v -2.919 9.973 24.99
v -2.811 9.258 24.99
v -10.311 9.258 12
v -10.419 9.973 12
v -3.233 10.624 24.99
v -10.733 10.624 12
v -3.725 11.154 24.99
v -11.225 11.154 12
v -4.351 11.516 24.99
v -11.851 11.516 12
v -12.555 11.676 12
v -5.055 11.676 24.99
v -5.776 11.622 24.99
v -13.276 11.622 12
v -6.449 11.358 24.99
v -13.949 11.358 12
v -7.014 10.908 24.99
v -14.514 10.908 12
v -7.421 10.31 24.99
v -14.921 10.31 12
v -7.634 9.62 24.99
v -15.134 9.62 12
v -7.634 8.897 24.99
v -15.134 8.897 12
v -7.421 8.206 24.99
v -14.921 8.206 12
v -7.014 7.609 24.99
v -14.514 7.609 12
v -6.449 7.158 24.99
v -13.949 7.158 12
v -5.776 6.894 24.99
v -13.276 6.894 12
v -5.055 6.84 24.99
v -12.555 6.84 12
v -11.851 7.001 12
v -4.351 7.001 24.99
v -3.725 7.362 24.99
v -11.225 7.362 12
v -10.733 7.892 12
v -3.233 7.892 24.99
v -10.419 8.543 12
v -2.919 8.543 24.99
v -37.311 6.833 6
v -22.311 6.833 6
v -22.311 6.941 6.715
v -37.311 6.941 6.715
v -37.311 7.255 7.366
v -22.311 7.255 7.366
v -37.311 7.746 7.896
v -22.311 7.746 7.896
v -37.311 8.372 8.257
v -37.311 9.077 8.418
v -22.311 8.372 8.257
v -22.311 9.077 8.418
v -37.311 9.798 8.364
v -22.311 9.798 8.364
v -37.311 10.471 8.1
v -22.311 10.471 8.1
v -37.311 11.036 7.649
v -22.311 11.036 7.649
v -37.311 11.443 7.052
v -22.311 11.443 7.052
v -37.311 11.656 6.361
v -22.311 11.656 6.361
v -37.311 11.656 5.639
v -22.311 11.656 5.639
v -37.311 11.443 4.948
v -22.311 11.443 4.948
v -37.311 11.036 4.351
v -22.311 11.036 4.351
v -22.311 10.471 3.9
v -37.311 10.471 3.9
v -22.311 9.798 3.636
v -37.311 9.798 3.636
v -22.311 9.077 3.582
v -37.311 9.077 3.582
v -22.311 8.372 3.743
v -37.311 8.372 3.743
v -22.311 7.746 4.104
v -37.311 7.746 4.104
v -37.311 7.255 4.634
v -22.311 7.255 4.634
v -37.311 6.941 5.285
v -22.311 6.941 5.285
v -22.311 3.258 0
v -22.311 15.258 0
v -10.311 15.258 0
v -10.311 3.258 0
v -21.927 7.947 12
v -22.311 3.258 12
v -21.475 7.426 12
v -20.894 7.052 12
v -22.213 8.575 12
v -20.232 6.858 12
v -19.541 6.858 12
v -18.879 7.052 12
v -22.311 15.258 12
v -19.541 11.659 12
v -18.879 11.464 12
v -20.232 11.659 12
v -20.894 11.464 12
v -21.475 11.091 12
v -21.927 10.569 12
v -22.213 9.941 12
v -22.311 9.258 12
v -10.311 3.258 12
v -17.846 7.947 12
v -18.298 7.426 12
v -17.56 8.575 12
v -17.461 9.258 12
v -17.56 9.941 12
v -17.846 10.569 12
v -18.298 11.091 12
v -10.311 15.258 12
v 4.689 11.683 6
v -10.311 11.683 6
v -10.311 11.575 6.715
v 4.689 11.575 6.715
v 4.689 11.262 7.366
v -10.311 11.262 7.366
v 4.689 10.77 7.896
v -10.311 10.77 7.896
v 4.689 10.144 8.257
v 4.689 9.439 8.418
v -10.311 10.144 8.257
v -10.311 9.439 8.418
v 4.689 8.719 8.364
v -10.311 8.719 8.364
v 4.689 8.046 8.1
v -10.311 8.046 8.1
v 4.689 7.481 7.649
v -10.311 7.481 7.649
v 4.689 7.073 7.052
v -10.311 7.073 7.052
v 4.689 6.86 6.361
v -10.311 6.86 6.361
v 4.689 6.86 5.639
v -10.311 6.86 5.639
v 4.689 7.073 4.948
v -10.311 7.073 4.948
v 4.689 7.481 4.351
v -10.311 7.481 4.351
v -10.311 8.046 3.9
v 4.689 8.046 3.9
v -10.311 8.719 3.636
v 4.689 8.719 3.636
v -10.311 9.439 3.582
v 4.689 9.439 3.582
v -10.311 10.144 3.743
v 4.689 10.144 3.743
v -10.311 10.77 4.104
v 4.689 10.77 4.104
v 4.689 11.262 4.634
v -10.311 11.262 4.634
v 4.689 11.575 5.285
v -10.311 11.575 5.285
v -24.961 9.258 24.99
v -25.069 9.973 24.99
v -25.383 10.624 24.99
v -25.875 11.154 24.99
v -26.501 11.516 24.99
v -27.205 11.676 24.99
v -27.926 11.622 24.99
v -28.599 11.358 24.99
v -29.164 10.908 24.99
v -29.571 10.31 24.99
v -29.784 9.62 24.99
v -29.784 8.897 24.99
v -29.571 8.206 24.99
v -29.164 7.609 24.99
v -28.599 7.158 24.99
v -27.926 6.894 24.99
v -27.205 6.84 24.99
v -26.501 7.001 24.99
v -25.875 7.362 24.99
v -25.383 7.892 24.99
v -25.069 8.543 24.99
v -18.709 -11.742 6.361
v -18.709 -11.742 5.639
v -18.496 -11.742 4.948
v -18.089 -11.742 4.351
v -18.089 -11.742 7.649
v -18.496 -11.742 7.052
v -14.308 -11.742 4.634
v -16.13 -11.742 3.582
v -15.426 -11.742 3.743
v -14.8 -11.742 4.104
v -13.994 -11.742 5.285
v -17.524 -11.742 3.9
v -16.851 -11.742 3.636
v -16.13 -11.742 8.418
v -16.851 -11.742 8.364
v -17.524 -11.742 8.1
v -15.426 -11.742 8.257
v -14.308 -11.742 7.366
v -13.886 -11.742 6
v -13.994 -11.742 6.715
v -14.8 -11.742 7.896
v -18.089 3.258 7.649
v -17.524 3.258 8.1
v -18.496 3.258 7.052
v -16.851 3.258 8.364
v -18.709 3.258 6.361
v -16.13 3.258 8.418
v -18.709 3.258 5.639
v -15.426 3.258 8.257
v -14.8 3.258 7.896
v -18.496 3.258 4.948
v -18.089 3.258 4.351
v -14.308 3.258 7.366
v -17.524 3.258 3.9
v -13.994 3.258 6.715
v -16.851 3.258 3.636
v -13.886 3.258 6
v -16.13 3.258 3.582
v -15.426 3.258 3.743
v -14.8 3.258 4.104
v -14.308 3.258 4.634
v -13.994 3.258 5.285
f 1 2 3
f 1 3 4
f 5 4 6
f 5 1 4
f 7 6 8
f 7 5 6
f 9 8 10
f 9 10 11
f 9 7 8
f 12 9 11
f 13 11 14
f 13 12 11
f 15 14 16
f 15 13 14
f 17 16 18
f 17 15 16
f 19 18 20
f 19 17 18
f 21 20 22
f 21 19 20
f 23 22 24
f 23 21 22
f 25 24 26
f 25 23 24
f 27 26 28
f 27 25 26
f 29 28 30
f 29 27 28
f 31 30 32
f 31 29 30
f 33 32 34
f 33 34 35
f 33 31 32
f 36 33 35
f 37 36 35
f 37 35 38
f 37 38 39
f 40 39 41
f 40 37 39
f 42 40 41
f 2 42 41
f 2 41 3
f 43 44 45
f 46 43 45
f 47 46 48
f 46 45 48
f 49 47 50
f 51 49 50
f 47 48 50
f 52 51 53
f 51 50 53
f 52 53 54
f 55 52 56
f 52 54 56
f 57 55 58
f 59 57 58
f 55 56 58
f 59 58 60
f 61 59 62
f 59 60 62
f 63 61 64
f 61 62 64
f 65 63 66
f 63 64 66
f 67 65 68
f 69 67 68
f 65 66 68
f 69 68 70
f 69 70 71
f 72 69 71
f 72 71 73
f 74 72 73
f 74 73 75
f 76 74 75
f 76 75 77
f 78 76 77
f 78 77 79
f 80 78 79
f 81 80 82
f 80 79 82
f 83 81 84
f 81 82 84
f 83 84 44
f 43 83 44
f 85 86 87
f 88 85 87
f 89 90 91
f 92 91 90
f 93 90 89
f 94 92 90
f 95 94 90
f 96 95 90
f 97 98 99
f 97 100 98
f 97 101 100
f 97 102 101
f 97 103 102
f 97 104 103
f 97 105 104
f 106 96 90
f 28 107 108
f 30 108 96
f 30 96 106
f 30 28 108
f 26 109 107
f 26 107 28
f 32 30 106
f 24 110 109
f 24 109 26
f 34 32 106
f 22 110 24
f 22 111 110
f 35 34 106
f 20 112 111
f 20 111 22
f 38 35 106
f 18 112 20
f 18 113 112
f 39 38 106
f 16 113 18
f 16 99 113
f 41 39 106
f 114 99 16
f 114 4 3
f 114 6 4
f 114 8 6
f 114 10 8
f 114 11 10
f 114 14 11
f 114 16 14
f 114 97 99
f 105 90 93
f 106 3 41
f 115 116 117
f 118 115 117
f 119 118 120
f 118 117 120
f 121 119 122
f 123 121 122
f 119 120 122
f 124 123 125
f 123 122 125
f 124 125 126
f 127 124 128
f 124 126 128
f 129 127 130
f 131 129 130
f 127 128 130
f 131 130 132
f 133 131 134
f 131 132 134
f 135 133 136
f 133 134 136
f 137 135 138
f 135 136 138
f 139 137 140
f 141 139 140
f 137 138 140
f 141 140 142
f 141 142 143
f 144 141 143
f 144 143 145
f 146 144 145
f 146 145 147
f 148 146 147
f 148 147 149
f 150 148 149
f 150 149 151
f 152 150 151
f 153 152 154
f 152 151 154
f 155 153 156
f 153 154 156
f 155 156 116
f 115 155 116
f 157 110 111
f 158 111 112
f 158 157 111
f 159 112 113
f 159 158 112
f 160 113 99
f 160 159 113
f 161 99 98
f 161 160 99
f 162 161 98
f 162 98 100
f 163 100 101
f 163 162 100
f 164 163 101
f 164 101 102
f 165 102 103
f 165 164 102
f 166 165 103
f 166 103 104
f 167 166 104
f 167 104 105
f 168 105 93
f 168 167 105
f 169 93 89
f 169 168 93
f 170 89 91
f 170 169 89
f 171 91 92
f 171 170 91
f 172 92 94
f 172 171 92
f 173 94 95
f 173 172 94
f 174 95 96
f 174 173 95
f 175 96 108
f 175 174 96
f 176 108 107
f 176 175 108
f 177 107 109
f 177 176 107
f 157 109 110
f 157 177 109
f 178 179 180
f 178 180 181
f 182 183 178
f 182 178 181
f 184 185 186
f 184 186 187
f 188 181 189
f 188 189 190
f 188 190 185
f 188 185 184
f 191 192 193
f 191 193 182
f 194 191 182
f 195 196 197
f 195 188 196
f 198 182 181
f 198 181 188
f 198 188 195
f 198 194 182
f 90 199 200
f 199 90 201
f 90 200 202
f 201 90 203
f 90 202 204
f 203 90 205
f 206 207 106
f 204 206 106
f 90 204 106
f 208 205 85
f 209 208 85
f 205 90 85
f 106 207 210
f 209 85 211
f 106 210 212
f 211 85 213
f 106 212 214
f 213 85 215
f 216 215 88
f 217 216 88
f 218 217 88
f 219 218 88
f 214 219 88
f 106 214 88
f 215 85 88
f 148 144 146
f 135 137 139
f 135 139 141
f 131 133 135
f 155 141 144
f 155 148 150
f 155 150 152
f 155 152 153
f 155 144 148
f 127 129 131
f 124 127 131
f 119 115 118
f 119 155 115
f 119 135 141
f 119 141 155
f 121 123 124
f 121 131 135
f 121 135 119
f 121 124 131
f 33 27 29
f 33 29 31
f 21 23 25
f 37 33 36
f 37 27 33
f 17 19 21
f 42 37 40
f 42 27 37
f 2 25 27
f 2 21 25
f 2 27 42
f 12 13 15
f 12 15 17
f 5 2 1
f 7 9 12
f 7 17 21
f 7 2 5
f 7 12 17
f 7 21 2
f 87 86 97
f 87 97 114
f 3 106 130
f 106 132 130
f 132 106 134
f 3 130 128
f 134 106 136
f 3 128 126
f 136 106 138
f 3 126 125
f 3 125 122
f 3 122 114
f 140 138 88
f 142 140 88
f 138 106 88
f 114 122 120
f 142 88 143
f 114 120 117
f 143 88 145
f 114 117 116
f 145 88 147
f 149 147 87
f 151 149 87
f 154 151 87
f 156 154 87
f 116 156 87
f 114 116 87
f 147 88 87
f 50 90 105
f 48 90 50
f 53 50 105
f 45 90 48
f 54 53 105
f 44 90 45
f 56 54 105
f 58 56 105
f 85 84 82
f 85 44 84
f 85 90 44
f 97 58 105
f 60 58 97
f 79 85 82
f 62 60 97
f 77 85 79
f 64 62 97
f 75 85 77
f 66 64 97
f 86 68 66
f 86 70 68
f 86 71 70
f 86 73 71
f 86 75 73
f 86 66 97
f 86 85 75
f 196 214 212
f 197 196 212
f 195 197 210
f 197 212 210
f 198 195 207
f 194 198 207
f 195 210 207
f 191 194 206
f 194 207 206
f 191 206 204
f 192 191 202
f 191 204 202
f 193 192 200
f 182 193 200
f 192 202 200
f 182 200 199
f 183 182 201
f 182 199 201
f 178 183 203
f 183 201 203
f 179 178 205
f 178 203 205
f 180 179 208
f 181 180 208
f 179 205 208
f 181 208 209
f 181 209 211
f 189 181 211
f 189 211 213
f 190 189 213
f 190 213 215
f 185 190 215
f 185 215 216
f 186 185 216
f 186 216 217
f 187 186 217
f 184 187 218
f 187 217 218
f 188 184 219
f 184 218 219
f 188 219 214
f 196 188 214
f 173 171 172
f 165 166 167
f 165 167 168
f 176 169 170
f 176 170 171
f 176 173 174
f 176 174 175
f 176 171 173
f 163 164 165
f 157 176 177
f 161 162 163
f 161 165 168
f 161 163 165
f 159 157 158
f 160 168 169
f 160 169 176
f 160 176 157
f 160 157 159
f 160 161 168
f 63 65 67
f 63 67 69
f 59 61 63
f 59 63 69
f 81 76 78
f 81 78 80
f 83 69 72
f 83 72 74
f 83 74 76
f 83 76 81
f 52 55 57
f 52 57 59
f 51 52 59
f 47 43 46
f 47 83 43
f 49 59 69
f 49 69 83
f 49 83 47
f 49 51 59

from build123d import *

# Parameters (mm, degrees)
F0_W     = 12
F0_H     = 12
F1_DEPTH = 12
F2_R     = 2.425
F3_DEPTH = 15
F4_R     = 2.425
F5_DEPTH = 15
F6_R     = 2.425
F7_DEPTH = 15
F8_R     = 2.425


with BuildPart() as f1:
    # F0 (on Top) → F1 (new body)
    with BuildSketch(Plane.XY):
        with Locations((-16.311498, 9.258204)):
            Rectangle(F0_W, F0_H)
    extrude(amount=F1_DEPTH)

    # F2 (on face) → F3 (join)
    with BuildSketch(Plane.YZ.offset(-10.311498)):
        with Locations((9.258204, 6)):
            Circle(F2_R)
    extrude(amount=F3_DEPTH)

    # F4 (on face) → F5 (join)
    with BuildSketch(Plane(origin=(-22.311498, 0, 0), x_dir=(0, -1, 0), z_dir=(-1, 0, 0))):
        with Locations((-9.258204, 6)):
            Circle(F4_R)
    extrude(amount=F5_DEPTH)

    # F6 (on face) → F7 (join)
    with BuildSketch(Plane.XZ.offset(-3.258204)):
        with Locations((-16.311498, 6)):
            Circle(F6_R)
    extrude(amount=F7_DEPTH)

    # F10: sweep along a path in F9
    with BuildLine(Plane(origin=(0, 15.258204, 0), x_dir=(-1, 0, 0), z_dir=(0, 1, 0))) as f10_path:
        Line((12.736498, 12), (5.236498, 24.990381))
    # F8 (on face) → F10 (sweep)
    with BuildSketch(Plane.XY.offset(12)):
        with Locations((-12.736498, 9.258204)):
            Circle(F8_R)
    sweep(path=f10_path.line)

    # F11: sweep along a path in F9
    with BuildLine(Plane(origin=(0, 15.258204, 0), x_dir=(-1, 0, 0), z_dir=(0, 1, 0))) as f11_path:
        Line((19.886498, 12), (27.386498, 24.990381))
    # F8 (on face) → F11 (sweep)
    with BuildSketch(Plane.XY.offset(12)):
        with BuildLine():
            ThreePointArc((-22.311498, 9.258204), (-19.886498, 6.833204), (-17.461498, 9.258204))
            ThreePointArc((-17.461498, 9.258204), (-19.886498, 11.683204), (-22.311498, 9.258204))
        make_face()
    sweep(path=f11_path.line)


solid = f1.part
